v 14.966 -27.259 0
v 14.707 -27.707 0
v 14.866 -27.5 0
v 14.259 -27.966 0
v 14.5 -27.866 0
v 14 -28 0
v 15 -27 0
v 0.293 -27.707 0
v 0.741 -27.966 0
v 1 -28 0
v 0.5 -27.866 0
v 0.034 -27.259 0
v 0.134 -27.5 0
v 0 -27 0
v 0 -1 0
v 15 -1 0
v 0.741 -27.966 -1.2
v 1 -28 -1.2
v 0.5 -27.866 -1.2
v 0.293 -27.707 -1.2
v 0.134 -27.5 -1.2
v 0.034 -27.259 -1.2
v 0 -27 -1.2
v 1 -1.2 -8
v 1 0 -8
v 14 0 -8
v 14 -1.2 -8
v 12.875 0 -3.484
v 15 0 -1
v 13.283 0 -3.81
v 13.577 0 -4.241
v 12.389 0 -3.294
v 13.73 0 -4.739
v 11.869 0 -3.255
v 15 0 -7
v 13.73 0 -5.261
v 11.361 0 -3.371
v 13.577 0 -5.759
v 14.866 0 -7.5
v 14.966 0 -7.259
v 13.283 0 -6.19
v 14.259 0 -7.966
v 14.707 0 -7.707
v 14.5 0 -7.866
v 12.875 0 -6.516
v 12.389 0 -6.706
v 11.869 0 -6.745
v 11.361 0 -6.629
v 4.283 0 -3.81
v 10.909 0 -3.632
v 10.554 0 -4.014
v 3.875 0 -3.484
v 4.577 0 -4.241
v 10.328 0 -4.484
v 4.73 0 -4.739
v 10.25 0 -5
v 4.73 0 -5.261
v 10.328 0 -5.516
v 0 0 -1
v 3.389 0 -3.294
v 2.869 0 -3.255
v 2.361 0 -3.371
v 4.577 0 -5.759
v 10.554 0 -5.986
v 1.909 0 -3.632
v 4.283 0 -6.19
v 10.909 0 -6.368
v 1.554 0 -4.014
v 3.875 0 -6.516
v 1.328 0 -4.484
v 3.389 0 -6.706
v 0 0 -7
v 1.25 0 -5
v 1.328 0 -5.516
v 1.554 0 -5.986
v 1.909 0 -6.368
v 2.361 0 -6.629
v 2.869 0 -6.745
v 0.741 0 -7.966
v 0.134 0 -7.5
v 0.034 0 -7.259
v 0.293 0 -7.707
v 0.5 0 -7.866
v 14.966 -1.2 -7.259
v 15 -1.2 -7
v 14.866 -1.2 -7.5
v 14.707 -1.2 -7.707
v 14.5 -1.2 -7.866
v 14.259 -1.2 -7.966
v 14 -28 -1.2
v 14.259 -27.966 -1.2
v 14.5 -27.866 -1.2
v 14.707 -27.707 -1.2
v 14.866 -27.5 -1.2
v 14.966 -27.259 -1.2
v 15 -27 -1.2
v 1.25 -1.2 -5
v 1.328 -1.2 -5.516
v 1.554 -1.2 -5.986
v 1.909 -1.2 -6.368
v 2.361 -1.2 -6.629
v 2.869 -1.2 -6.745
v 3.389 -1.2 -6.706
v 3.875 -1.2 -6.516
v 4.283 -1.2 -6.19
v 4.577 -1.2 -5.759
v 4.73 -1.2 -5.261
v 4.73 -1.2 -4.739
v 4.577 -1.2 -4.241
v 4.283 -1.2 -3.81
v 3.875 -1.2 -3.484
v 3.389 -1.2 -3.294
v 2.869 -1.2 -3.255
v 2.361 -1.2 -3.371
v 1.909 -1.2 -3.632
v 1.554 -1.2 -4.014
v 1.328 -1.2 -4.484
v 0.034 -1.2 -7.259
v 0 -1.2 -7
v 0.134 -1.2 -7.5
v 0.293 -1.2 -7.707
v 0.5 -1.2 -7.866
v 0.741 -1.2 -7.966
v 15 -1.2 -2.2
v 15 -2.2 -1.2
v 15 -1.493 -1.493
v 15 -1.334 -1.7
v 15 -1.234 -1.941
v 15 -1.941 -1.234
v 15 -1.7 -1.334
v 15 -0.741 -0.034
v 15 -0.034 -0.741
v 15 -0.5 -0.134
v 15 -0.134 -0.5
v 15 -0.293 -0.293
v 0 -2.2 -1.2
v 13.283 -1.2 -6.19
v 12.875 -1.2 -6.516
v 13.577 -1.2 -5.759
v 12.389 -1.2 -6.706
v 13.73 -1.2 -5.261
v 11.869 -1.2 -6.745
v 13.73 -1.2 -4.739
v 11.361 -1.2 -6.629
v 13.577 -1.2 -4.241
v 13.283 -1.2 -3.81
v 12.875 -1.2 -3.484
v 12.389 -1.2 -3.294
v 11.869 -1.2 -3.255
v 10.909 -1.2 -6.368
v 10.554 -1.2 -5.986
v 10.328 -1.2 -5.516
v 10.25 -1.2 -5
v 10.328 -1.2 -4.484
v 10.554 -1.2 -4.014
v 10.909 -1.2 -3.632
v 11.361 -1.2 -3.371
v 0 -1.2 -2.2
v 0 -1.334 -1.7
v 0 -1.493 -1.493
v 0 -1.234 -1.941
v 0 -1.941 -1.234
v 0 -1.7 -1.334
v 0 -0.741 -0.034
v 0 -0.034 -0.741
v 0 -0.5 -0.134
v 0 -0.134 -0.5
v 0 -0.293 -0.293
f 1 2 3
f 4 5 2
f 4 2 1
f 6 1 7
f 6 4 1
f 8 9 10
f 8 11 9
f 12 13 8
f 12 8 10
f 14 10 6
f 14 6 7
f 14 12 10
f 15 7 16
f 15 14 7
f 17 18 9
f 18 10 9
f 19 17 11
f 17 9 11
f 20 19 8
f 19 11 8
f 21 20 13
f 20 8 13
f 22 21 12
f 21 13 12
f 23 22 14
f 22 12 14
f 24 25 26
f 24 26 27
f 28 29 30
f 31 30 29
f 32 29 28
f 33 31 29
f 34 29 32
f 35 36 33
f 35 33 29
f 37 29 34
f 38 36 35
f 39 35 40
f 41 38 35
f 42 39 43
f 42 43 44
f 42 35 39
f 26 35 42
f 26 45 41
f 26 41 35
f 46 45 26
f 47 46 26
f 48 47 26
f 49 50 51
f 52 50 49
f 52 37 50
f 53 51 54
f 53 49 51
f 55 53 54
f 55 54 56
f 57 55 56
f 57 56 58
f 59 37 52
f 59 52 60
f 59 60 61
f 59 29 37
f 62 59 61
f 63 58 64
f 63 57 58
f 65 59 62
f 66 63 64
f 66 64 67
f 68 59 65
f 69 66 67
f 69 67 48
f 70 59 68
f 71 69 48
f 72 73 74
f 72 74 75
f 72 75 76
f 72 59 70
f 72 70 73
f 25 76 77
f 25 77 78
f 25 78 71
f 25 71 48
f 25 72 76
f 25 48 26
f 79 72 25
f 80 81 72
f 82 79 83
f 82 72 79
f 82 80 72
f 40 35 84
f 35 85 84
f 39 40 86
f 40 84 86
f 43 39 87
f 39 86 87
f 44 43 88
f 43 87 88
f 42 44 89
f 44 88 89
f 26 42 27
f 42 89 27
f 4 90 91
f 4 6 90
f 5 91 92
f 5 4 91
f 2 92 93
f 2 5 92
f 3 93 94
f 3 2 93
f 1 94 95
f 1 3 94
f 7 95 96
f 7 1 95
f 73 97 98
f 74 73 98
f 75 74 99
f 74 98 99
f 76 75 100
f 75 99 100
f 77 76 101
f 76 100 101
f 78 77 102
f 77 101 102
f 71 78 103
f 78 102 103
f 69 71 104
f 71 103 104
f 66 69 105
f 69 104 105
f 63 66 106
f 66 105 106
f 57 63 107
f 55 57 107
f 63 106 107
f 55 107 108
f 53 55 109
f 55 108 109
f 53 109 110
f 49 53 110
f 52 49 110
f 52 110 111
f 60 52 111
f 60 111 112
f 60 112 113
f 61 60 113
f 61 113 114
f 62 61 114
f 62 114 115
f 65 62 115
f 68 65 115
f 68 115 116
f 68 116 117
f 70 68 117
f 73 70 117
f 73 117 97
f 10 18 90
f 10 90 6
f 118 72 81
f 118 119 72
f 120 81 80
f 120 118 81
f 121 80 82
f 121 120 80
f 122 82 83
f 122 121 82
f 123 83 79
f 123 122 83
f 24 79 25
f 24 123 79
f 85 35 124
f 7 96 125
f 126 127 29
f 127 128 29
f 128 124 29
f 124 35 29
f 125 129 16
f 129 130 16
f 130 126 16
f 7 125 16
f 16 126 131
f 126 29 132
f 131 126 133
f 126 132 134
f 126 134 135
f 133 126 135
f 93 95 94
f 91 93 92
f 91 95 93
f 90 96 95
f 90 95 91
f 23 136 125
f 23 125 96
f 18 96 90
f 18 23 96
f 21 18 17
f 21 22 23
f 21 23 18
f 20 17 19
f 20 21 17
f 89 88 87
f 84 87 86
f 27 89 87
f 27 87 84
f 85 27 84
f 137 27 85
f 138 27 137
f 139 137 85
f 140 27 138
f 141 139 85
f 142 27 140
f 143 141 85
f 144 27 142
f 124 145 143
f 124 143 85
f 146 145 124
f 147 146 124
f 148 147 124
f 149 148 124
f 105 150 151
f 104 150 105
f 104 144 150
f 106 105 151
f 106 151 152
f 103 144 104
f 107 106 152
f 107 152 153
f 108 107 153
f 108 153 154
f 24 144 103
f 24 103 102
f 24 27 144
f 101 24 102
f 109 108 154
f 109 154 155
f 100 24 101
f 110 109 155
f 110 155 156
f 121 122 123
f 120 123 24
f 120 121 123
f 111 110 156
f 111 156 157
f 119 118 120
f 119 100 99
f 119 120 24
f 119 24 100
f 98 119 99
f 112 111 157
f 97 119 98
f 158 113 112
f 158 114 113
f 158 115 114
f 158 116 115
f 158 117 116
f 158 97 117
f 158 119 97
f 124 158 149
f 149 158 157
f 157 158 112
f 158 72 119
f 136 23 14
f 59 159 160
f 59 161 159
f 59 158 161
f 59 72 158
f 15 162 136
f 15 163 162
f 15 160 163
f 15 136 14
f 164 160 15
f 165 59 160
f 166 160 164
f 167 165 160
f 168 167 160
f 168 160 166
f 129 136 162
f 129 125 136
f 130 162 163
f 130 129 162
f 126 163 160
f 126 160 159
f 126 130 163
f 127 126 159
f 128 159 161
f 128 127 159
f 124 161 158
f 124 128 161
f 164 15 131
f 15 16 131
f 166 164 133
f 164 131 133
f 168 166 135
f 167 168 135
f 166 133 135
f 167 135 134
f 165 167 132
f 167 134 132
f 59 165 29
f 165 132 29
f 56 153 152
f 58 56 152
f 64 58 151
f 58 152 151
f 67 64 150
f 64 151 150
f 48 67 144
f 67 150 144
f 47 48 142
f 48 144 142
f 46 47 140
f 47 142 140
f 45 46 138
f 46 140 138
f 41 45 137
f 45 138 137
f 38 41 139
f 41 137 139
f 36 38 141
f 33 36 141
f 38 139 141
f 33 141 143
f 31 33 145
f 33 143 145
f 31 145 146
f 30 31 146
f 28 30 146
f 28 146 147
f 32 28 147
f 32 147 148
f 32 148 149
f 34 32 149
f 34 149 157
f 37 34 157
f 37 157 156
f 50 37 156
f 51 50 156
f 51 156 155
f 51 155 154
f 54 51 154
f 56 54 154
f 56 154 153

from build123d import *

# Parameters (mm, degrees)
EXTRUDE_1_DEPTH             = 15
HOLE_WIZARD_3_5_3_5_1_D     = 3.5
HOLE_WIZARD_3_5_3_5_1_DEPTH = 4
FILLET_1_R                  = 1
FILLET_2_R                  = 1


with BuildPart() as part:
    # 草图5 → 拉伸-薄壁1 (new body)
    with BuildSketch(Plane(origin=(0, 0, 0), x_dir=(0, 0, -1), z_dir=(1, 0, 0))):
        Polygon((0, -28), (0, 0), (8, 0), (8, -1.2), (1.2, -1.2), (1.2, -28), align=None)
    extrude(amount=EXTRUDE_1_DEPTH)

    # Ø3.5 (3.5) 直径孔1
    with Locations(Plane(origin=(4.305374672, 0, -7.219790434), x_dir=(1, 0, 0), z_dir=(0, 1, 0))):
        with Locations((7.694625328, -2.219790434), (-1.305374672, -2.219790434)):
            Hole(HOLE_WIZARD_3_5_3_5_1_D / 2, depth=HOLE_WIZARD_3_5_3_5_1_DEPTH)

    # 圆角1
    fillet_1_edges = [part.edges().sort_by_distance(p)[0] for p in [
        (15, -28, -0.6),
        (0, -28, -0.6),
        (0, -0.6, -8),
        (15, -0.6, -8),
    ]]
    fillet(fillet_1_edges, radius=FILLET_1_R)

    # 圆角2
    fillet_2_edges = [part.edges().sort_by_distance(p)[0] for p in [
        (7.5, -1.2, -1.2),
        (7.5, 0, 0),
    ]]
    fillet(fillet_2_edges, radius=FILLET_2_R)


solid = part.part
